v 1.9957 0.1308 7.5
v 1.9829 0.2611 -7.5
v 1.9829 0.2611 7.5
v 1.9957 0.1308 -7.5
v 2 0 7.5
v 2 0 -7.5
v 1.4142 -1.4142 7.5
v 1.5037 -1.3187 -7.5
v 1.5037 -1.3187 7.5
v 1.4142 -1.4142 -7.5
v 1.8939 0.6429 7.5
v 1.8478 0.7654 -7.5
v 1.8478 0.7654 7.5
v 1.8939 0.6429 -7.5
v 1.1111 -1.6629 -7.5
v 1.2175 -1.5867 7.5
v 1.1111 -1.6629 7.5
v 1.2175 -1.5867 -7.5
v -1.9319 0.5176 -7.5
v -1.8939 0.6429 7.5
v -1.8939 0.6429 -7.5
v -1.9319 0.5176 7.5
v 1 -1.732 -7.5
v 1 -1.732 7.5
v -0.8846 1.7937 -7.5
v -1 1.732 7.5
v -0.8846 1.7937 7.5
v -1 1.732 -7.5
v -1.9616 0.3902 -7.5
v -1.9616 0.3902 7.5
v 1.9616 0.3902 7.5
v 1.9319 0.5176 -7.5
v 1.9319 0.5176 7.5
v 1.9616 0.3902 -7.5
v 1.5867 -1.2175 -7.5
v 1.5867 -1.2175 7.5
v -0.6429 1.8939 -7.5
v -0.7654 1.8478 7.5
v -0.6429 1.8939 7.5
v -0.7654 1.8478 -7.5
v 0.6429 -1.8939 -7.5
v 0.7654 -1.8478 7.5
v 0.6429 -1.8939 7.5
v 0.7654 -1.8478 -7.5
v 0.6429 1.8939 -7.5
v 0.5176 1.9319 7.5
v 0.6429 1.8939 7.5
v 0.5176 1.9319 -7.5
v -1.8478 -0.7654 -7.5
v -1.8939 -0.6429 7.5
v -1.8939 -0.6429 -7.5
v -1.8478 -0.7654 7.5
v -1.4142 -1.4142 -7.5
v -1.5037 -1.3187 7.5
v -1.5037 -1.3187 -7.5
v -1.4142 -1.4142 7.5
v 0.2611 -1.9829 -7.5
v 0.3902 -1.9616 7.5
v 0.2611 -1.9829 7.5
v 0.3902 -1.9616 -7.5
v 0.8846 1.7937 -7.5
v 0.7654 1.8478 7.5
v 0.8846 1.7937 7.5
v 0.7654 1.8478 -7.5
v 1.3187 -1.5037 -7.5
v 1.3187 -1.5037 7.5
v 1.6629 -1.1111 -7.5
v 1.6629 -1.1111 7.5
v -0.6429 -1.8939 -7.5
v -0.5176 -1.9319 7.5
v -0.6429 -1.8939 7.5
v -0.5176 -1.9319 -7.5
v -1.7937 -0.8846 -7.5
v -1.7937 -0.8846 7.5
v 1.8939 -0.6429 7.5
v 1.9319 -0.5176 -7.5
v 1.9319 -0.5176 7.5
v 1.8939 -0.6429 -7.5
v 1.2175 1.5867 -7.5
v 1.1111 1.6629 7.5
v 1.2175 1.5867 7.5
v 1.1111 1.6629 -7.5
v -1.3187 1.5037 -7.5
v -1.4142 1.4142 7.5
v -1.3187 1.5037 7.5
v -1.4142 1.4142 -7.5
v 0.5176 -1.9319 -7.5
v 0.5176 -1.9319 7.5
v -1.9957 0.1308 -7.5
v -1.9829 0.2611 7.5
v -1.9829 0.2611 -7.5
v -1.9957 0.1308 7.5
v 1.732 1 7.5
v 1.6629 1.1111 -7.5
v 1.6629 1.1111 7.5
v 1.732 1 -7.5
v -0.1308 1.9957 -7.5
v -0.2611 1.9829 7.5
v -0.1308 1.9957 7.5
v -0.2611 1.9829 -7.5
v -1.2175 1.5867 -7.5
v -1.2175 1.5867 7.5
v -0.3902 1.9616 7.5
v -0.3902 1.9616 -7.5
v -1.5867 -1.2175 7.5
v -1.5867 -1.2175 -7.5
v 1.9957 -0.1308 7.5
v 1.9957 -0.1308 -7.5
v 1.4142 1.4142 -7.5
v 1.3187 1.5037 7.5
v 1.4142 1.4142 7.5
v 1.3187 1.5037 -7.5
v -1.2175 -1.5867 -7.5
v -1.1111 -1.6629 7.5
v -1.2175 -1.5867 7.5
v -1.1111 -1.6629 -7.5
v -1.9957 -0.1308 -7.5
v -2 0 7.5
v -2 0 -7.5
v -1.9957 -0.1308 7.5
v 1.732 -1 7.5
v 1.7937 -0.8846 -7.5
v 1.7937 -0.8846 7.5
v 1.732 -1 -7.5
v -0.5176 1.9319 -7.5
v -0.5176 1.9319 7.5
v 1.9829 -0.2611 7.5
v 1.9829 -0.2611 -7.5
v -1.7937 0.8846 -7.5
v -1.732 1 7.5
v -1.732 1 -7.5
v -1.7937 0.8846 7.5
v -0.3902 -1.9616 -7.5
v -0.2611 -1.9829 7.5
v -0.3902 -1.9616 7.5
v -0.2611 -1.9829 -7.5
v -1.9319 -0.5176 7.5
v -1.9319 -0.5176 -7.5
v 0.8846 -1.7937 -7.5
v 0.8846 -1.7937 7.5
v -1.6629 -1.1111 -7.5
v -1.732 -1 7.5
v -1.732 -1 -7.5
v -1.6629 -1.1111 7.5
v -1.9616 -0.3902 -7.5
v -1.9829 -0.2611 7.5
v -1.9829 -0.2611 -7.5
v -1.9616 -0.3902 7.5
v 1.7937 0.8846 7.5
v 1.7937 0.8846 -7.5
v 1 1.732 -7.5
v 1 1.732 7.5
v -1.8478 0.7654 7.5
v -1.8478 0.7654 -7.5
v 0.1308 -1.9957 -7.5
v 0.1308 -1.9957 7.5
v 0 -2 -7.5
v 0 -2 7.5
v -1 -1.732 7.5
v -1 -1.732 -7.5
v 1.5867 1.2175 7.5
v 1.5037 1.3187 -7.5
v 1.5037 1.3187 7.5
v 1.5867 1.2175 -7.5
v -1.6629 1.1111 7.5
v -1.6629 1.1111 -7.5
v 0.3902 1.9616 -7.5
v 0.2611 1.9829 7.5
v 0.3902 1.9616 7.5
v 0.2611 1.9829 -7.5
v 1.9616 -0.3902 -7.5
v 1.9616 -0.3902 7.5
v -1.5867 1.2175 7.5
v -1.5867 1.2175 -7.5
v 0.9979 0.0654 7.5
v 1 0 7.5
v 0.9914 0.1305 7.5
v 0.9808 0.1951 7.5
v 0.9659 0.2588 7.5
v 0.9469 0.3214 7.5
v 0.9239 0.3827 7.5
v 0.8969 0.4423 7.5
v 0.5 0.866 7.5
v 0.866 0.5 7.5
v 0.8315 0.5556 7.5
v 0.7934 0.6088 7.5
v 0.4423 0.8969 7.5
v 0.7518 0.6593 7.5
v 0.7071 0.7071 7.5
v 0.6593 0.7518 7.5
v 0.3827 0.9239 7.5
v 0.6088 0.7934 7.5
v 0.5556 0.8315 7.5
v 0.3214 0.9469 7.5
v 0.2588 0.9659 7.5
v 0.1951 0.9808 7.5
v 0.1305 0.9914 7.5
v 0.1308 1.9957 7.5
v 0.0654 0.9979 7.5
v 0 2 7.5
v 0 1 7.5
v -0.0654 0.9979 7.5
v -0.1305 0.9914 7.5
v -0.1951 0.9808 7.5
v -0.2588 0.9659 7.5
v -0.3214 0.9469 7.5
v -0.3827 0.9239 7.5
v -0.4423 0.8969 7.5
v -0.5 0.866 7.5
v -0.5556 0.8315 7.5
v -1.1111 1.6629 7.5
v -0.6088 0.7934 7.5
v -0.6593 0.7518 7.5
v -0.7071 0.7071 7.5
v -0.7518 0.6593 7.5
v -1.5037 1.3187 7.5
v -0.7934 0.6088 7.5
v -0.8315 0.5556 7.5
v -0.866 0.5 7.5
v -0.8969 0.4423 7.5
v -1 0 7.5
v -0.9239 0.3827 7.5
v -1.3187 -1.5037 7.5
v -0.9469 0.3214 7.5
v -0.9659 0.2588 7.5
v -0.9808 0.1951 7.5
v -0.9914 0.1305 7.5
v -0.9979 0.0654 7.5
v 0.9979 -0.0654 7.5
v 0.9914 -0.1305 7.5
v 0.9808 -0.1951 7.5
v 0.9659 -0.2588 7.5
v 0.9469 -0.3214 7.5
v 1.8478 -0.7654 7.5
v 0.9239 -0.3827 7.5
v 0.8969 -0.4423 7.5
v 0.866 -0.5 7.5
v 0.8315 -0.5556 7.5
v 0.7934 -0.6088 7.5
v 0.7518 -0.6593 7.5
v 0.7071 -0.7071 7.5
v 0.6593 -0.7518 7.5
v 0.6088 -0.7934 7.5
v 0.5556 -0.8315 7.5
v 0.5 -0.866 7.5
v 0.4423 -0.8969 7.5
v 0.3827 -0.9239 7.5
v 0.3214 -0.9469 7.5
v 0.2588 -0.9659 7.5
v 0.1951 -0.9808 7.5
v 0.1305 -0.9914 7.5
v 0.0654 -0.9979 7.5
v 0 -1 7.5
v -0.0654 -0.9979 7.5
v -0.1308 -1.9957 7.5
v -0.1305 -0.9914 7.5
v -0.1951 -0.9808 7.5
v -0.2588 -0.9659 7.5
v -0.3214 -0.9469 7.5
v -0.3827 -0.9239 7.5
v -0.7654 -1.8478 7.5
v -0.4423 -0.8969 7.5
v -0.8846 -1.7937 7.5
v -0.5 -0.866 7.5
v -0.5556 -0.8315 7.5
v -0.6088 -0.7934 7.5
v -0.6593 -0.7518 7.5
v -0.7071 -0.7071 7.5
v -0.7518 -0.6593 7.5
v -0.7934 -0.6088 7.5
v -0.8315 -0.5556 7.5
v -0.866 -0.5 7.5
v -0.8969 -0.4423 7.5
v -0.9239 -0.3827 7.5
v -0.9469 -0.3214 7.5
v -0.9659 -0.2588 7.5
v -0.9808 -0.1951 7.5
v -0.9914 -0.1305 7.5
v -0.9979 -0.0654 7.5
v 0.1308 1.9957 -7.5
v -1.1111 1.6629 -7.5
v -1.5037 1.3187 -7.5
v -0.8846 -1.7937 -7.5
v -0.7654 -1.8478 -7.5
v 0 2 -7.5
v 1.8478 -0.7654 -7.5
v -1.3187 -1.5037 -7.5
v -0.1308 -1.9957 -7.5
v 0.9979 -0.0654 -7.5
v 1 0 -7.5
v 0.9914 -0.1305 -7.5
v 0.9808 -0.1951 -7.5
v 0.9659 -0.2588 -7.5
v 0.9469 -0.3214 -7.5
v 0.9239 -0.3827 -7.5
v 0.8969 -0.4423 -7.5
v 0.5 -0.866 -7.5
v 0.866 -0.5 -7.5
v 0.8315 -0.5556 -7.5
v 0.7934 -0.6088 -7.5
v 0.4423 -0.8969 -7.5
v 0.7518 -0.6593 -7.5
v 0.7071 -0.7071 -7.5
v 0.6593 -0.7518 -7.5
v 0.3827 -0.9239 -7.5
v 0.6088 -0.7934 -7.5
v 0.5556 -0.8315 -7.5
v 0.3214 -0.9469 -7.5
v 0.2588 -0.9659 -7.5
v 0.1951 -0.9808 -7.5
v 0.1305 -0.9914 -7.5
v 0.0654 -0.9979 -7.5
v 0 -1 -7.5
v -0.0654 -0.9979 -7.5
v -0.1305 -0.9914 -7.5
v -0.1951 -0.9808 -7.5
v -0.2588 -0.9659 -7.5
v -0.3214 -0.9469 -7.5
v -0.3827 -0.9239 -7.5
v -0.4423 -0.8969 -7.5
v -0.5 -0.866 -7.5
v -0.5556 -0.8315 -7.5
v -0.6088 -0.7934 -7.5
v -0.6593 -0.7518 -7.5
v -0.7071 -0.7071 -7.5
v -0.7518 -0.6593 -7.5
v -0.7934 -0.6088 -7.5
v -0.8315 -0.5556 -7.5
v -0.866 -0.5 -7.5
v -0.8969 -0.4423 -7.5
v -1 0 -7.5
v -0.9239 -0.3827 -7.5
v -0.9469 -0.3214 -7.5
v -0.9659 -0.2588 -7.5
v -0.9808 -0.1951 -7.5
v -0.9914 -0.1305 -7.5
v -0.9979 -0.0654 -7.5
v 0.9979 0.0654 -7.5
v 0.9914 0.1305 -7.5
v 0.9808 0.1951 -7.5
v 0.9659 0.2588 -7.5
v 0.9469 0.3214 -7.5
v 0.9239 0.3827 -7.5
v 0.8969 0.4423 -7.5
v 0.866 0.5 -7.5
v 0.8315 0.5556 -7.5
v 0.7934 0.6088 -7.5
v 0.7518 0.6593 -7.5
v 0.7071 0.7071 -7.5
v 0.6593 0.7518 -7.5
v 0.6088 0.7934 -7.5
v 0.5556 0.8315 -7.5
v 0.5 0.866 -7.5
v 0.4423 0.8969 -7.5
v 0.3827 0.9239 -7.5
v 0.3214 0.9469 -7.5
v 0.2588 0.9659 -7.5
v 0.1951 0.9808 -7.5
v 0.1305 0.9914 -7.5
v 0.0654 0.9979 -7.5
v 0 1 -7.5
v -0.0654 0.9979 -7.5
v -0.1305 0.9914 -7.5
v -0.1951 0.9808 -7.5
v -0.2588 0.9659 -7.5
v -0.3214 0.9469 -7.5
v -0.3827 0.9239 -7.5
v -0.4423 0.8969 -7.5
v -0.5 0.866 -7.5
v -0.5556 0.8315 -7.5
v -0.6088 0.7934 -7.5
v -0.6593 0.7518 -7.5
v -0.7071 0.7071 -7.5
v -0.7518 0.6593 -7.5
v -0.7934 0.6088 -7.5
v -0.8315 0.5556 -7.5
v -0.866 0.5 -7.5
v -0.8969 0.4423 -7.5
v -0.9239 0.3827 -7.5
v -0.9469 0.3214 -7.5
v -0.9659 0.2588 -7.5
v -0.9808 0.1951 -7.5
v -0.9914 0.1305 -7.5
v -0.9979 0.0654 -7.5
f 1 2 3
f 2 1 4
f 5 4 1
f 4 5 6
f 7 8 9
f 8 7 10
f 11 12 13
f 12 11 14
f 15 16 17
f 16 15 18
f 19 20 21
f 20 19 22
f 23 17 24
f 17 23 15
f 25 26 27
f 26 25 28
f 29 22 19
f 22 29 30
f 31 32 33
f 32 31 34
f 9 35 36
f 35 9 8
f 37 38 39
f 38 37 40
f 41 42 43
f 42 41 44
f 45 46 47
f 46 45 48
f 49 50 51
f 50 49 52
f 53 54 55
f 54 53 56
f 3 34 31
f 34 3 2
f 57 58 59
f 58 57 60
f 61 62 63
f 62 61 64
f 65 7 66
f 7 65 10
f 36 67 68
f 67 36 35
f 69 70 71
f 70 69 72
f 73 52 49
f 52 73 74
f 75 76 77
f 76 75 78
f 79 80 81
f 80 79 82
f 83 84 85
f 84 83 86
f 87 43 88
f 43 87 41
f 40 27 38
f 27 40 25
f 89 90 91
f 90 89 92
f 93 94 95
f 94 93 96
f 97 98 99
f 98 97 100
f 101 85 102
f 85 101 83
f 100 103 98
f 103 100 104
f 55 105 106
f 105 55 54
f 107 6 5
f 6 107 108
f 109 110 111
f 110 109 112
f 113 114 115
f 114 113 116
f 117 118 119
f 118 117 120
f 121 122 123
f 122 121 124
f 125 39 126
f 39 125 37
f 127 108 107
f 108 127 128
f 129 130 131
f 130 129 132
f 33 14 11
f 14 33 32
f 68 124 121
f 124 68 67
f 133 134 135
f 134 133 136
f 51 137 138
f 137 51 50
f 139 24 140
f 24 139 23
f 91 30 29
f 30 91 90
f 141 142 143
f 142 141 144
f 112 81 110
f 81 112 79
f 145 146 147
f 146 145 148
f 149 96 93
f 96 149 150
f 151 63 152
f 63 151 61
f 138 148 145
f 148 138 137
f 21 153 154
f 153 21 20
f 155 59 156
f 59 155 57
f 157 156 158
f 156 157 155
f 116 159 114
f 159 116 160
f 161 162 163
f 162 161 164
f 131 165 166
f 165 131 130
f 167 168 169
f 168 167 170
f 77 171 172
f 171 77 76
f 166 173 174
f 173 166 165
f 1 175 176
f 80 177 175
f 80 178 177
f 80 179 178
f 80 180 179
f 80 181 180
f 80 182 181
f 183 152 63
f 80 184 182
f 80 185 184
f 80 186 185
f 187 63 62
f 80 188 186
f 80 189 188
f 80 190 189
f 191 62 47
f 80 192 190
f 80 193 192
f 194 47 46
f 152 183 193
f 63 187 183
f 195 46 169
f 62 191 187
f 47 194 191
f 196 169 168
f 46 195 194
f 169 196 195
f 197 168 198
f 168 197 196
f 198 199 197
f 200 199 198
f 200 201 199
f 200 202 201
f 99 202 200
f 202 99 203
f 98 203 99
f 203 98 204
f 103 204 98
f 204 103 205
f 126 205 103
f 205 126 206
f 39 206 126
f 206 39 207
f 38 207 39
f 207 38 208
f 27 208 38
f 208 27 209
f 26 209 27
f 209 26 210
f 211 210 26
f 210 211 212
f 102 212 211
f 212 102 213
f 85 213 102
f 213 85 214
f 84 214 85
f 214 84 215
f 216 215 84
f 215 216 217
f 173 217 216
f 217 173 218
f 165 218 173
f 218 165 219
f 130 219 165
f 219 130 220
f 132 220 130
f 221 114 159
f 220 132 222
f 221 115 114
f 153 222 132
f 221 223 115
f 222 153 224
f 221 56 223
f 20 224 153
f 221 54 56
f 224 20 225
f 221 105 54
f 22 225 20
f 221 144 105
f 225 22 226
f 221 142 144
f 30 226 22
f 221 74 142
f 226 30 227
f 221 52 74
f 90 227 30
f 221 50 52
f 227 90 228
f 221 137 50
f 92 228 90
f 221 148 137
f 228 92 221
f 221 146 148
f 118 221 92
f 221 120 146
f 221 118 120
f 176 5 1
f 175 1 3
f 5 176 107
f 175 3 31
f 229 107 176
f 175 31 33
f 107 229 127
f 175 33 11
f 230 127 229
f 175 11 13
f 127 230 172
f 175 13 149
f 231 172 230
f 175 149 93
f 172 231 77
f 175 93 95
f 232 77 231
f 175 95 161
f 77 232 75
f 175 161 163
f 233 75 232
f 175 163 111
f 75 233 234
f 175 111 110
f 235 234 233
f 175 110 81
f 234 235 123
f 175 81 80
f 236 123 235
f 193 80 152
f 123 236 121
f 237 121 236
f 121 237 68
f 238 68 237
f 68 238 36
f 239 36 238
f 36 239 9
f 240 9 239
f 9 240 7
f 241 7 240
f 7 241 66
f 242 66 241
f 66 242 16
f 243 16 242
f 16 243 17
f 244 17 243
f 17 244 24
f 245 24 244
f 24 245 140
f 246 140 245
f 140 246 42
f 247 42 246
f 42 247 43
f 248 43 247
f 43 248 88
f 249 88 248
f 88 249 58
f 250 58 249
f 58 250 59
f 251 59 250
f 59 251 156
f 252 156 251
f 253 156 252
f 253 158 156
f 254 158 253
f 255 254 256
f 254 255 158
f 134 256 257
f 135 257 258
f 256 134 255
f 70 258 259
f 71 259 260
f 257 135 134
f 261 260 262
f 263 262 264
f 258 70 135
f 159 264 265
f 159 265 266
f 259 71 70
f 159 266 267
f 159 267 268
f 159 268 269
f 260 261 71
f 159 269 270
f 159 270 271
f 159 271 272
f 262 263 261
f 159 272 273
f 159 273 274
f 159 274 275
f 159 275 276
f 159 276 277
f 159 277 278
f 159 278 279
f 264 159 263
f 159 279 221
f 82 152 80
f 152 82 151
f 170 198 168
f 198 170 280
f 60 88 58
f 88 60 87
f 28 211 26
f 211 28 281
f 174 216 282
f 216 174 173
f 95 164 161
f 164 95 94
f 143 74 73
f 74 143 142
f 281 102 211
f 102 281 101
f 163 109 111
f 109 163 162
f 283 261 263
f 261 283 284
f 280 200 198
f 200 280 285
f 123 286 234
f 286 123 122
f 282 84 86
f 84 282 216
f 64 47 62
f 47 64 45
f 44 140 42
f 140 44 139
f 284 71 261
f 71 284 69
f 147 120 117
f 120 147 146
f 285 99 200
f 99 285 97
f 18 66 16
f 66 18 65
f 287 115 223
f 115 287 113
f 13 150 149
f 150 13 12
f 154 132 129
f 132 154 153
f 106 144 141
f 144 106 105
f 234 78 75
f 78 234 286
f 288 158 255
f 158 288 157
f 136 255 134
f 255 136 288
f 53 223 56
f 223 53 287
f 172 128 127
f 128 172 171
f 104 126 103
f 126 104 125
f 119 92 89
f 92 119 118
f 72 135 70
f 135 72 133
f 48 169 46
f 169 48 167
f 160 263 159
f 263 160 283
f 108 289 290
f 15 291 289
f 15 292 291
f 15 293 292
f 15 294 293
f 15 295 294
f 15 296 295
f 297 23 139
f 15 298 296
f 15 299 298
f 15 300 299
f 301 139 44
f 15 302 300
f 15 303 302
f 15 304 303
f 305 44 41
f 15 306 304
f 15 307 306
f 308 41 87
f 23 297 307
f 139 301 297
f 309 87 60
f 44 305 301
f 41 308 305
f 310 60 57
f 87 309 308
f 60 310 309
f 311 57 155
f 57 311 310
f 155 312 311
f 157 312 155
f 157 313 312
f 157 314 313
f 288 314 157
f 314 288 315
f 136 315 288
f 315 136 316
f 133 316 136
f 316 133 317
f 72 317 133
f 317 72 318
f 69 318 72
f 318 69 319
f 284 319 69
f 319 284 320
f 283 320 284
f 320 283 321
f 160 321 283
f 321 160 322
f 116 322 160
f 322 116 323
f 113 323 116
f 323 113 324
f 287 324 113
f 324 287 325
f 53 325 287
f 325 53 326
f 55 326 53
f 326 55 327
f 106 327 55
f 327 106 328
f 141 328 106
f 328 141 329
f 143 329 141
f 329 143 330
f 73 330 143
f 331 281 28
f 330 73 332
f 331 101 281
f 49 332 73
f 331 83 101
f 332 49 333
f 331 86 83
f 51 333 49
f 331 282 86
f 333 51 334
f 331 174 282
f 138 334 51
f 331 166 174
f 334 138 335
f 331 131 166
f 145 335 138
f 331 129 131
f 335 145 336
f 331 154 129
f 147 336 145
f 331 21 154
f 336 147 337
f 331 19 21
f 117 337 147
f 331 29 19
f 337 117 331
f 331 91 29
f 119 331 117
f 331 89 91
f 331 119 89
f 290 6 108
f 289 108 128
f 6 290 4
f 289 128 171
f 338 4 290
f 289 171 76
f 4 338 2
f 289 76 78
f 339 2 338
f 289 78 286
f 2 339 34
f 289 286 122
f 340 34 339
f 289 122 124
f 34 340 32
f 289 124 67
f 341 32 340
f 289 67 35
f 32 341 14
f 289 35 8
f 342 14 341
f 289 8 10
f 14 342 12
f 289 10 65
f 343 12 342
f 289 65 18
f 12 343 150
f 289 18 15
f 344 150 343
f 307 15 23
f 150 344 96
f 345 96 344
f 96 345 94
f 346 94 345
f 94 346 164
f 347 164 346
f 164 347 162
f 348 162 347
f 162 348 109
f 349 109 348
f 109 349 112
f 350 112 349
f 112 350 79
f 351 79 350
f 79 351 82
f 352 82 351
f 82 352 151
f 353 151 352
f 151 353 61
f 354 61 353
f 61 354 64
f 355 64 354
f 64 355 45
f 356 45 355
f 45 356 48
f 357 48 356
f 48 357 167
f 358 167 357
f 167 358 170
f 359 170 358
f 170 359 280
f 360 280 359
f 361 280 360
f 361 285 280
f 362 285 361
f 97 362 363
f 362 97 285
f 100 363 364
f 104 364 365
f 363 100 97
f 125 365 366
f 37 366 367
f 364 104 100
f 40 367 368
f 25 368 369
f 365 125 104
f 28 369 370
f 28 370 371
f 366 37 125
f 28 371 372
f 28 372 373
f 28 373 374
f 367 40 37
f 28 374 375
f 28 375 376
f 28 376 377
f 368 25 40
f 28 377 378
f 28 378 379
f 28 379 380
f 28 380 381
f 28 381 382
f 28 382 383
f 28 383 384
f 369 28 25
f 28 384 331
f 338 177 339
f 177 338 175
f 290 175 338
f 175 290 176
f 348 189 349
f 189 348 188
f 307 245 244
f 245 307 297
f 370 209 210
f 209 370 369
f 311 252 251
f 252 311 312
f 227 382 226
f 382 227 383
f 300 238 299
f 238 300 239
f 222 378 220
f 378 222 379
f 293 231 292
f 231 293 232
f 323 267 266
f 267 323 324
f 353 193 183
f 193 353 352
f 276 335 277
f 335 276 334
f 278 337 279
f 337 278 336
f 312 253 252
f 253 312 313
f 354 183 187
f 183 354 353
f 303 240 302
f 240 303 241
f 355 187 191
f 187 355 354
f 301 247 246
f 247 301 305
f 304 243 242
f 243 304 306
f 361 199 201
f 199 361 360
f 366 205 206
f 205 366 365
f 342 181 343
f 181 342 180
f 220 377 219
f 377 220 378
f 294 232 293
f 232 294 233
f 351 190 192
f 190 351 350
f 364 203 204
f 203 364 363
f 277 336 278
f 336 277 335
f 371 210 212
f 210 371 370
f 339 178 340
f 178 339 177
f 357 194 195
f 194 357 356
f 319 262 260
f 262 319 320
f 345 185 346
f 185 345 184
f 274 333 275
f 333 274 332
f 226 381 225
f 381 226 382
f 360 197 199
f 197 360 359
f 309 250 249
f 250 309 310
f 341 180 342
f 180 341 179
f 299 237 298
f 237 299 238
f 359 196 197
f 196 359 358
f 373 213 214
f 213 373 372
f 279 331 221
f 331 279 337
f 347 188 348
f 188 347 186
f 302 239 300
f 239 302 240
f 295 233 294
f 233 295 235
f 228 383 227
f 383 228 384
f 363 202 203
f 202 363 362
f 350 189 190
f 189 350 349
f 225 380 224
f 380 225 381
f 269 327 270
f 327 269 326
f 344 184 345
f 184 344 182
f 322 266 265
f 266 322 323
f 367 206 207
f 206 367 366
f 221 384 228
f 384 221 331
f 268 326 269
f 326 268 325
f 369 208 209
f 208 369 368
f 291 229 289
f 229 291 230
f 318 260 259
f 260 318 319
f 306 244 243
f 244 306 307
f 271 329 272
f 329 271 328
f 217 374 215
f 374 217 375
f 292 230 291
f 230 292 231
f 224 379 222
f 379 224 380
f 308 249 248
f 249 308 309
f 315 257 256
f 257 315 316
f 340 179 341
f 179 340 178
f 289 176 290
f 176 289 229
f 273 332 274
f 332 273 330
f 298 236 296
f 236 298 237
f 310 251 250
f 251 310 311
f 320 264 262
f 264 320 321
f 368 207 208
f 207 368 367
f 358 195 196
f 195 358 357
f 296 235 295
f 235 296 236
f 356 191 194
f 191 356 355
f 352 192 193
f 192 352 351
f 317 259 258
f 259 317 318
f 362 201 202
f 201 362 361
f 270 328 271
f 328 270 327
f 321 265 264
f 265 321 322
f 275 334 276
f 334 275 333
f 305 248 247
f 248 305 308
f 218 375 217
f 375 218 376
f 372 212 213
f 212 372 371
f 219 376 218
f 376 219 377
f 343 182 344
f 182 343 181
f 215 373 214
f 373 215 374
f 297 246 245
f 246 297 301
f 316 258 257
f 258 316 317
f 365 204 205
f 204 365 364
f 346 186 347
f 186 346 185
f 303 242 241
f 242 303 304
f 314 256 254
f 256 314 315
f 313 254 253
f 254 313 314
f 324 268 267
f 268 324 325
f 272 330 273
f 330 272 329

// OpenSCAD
// PTFE Tubing (single connected solid)

// Parameters
length = 15; //[7.5:30:0.5]
outer_diameter = 4; //[2:8:0.1]
inner_diameter = 2; //[1:6:0.1]
forced_id = 0; //[0:6:0.1]
center = 1; //[0:1:1]
eps = 0.8; //[0.5:2:0.1]

$fn = 96;

module tubing() {
  od = outer_diameter;
  id = (forced_id > 0) ? forced_id : inner_diameter;

  // Keep a guaranteed positive wall thickness
  min_wall = 0.2;
  id_safe = max(0, min(id, od - 2*min_wall));
  od_safe = max(od, id_safe + 2*min_wall);

  // Correct centering: if not centered, place base at z=0
  z_shift = center ? 0 : length/2;

  color([0.85, 0.85, 0.8])
  translate([0, 0, z_shift])
    difference() {
      cylinder(h=length, r=od_safe/2, center=true);
      // Slightly longer cut to ensure a clean through-hole
      cylinder(h=length + 2*eps, r=id_safe/2, center=true);
    }
}

tubing();
